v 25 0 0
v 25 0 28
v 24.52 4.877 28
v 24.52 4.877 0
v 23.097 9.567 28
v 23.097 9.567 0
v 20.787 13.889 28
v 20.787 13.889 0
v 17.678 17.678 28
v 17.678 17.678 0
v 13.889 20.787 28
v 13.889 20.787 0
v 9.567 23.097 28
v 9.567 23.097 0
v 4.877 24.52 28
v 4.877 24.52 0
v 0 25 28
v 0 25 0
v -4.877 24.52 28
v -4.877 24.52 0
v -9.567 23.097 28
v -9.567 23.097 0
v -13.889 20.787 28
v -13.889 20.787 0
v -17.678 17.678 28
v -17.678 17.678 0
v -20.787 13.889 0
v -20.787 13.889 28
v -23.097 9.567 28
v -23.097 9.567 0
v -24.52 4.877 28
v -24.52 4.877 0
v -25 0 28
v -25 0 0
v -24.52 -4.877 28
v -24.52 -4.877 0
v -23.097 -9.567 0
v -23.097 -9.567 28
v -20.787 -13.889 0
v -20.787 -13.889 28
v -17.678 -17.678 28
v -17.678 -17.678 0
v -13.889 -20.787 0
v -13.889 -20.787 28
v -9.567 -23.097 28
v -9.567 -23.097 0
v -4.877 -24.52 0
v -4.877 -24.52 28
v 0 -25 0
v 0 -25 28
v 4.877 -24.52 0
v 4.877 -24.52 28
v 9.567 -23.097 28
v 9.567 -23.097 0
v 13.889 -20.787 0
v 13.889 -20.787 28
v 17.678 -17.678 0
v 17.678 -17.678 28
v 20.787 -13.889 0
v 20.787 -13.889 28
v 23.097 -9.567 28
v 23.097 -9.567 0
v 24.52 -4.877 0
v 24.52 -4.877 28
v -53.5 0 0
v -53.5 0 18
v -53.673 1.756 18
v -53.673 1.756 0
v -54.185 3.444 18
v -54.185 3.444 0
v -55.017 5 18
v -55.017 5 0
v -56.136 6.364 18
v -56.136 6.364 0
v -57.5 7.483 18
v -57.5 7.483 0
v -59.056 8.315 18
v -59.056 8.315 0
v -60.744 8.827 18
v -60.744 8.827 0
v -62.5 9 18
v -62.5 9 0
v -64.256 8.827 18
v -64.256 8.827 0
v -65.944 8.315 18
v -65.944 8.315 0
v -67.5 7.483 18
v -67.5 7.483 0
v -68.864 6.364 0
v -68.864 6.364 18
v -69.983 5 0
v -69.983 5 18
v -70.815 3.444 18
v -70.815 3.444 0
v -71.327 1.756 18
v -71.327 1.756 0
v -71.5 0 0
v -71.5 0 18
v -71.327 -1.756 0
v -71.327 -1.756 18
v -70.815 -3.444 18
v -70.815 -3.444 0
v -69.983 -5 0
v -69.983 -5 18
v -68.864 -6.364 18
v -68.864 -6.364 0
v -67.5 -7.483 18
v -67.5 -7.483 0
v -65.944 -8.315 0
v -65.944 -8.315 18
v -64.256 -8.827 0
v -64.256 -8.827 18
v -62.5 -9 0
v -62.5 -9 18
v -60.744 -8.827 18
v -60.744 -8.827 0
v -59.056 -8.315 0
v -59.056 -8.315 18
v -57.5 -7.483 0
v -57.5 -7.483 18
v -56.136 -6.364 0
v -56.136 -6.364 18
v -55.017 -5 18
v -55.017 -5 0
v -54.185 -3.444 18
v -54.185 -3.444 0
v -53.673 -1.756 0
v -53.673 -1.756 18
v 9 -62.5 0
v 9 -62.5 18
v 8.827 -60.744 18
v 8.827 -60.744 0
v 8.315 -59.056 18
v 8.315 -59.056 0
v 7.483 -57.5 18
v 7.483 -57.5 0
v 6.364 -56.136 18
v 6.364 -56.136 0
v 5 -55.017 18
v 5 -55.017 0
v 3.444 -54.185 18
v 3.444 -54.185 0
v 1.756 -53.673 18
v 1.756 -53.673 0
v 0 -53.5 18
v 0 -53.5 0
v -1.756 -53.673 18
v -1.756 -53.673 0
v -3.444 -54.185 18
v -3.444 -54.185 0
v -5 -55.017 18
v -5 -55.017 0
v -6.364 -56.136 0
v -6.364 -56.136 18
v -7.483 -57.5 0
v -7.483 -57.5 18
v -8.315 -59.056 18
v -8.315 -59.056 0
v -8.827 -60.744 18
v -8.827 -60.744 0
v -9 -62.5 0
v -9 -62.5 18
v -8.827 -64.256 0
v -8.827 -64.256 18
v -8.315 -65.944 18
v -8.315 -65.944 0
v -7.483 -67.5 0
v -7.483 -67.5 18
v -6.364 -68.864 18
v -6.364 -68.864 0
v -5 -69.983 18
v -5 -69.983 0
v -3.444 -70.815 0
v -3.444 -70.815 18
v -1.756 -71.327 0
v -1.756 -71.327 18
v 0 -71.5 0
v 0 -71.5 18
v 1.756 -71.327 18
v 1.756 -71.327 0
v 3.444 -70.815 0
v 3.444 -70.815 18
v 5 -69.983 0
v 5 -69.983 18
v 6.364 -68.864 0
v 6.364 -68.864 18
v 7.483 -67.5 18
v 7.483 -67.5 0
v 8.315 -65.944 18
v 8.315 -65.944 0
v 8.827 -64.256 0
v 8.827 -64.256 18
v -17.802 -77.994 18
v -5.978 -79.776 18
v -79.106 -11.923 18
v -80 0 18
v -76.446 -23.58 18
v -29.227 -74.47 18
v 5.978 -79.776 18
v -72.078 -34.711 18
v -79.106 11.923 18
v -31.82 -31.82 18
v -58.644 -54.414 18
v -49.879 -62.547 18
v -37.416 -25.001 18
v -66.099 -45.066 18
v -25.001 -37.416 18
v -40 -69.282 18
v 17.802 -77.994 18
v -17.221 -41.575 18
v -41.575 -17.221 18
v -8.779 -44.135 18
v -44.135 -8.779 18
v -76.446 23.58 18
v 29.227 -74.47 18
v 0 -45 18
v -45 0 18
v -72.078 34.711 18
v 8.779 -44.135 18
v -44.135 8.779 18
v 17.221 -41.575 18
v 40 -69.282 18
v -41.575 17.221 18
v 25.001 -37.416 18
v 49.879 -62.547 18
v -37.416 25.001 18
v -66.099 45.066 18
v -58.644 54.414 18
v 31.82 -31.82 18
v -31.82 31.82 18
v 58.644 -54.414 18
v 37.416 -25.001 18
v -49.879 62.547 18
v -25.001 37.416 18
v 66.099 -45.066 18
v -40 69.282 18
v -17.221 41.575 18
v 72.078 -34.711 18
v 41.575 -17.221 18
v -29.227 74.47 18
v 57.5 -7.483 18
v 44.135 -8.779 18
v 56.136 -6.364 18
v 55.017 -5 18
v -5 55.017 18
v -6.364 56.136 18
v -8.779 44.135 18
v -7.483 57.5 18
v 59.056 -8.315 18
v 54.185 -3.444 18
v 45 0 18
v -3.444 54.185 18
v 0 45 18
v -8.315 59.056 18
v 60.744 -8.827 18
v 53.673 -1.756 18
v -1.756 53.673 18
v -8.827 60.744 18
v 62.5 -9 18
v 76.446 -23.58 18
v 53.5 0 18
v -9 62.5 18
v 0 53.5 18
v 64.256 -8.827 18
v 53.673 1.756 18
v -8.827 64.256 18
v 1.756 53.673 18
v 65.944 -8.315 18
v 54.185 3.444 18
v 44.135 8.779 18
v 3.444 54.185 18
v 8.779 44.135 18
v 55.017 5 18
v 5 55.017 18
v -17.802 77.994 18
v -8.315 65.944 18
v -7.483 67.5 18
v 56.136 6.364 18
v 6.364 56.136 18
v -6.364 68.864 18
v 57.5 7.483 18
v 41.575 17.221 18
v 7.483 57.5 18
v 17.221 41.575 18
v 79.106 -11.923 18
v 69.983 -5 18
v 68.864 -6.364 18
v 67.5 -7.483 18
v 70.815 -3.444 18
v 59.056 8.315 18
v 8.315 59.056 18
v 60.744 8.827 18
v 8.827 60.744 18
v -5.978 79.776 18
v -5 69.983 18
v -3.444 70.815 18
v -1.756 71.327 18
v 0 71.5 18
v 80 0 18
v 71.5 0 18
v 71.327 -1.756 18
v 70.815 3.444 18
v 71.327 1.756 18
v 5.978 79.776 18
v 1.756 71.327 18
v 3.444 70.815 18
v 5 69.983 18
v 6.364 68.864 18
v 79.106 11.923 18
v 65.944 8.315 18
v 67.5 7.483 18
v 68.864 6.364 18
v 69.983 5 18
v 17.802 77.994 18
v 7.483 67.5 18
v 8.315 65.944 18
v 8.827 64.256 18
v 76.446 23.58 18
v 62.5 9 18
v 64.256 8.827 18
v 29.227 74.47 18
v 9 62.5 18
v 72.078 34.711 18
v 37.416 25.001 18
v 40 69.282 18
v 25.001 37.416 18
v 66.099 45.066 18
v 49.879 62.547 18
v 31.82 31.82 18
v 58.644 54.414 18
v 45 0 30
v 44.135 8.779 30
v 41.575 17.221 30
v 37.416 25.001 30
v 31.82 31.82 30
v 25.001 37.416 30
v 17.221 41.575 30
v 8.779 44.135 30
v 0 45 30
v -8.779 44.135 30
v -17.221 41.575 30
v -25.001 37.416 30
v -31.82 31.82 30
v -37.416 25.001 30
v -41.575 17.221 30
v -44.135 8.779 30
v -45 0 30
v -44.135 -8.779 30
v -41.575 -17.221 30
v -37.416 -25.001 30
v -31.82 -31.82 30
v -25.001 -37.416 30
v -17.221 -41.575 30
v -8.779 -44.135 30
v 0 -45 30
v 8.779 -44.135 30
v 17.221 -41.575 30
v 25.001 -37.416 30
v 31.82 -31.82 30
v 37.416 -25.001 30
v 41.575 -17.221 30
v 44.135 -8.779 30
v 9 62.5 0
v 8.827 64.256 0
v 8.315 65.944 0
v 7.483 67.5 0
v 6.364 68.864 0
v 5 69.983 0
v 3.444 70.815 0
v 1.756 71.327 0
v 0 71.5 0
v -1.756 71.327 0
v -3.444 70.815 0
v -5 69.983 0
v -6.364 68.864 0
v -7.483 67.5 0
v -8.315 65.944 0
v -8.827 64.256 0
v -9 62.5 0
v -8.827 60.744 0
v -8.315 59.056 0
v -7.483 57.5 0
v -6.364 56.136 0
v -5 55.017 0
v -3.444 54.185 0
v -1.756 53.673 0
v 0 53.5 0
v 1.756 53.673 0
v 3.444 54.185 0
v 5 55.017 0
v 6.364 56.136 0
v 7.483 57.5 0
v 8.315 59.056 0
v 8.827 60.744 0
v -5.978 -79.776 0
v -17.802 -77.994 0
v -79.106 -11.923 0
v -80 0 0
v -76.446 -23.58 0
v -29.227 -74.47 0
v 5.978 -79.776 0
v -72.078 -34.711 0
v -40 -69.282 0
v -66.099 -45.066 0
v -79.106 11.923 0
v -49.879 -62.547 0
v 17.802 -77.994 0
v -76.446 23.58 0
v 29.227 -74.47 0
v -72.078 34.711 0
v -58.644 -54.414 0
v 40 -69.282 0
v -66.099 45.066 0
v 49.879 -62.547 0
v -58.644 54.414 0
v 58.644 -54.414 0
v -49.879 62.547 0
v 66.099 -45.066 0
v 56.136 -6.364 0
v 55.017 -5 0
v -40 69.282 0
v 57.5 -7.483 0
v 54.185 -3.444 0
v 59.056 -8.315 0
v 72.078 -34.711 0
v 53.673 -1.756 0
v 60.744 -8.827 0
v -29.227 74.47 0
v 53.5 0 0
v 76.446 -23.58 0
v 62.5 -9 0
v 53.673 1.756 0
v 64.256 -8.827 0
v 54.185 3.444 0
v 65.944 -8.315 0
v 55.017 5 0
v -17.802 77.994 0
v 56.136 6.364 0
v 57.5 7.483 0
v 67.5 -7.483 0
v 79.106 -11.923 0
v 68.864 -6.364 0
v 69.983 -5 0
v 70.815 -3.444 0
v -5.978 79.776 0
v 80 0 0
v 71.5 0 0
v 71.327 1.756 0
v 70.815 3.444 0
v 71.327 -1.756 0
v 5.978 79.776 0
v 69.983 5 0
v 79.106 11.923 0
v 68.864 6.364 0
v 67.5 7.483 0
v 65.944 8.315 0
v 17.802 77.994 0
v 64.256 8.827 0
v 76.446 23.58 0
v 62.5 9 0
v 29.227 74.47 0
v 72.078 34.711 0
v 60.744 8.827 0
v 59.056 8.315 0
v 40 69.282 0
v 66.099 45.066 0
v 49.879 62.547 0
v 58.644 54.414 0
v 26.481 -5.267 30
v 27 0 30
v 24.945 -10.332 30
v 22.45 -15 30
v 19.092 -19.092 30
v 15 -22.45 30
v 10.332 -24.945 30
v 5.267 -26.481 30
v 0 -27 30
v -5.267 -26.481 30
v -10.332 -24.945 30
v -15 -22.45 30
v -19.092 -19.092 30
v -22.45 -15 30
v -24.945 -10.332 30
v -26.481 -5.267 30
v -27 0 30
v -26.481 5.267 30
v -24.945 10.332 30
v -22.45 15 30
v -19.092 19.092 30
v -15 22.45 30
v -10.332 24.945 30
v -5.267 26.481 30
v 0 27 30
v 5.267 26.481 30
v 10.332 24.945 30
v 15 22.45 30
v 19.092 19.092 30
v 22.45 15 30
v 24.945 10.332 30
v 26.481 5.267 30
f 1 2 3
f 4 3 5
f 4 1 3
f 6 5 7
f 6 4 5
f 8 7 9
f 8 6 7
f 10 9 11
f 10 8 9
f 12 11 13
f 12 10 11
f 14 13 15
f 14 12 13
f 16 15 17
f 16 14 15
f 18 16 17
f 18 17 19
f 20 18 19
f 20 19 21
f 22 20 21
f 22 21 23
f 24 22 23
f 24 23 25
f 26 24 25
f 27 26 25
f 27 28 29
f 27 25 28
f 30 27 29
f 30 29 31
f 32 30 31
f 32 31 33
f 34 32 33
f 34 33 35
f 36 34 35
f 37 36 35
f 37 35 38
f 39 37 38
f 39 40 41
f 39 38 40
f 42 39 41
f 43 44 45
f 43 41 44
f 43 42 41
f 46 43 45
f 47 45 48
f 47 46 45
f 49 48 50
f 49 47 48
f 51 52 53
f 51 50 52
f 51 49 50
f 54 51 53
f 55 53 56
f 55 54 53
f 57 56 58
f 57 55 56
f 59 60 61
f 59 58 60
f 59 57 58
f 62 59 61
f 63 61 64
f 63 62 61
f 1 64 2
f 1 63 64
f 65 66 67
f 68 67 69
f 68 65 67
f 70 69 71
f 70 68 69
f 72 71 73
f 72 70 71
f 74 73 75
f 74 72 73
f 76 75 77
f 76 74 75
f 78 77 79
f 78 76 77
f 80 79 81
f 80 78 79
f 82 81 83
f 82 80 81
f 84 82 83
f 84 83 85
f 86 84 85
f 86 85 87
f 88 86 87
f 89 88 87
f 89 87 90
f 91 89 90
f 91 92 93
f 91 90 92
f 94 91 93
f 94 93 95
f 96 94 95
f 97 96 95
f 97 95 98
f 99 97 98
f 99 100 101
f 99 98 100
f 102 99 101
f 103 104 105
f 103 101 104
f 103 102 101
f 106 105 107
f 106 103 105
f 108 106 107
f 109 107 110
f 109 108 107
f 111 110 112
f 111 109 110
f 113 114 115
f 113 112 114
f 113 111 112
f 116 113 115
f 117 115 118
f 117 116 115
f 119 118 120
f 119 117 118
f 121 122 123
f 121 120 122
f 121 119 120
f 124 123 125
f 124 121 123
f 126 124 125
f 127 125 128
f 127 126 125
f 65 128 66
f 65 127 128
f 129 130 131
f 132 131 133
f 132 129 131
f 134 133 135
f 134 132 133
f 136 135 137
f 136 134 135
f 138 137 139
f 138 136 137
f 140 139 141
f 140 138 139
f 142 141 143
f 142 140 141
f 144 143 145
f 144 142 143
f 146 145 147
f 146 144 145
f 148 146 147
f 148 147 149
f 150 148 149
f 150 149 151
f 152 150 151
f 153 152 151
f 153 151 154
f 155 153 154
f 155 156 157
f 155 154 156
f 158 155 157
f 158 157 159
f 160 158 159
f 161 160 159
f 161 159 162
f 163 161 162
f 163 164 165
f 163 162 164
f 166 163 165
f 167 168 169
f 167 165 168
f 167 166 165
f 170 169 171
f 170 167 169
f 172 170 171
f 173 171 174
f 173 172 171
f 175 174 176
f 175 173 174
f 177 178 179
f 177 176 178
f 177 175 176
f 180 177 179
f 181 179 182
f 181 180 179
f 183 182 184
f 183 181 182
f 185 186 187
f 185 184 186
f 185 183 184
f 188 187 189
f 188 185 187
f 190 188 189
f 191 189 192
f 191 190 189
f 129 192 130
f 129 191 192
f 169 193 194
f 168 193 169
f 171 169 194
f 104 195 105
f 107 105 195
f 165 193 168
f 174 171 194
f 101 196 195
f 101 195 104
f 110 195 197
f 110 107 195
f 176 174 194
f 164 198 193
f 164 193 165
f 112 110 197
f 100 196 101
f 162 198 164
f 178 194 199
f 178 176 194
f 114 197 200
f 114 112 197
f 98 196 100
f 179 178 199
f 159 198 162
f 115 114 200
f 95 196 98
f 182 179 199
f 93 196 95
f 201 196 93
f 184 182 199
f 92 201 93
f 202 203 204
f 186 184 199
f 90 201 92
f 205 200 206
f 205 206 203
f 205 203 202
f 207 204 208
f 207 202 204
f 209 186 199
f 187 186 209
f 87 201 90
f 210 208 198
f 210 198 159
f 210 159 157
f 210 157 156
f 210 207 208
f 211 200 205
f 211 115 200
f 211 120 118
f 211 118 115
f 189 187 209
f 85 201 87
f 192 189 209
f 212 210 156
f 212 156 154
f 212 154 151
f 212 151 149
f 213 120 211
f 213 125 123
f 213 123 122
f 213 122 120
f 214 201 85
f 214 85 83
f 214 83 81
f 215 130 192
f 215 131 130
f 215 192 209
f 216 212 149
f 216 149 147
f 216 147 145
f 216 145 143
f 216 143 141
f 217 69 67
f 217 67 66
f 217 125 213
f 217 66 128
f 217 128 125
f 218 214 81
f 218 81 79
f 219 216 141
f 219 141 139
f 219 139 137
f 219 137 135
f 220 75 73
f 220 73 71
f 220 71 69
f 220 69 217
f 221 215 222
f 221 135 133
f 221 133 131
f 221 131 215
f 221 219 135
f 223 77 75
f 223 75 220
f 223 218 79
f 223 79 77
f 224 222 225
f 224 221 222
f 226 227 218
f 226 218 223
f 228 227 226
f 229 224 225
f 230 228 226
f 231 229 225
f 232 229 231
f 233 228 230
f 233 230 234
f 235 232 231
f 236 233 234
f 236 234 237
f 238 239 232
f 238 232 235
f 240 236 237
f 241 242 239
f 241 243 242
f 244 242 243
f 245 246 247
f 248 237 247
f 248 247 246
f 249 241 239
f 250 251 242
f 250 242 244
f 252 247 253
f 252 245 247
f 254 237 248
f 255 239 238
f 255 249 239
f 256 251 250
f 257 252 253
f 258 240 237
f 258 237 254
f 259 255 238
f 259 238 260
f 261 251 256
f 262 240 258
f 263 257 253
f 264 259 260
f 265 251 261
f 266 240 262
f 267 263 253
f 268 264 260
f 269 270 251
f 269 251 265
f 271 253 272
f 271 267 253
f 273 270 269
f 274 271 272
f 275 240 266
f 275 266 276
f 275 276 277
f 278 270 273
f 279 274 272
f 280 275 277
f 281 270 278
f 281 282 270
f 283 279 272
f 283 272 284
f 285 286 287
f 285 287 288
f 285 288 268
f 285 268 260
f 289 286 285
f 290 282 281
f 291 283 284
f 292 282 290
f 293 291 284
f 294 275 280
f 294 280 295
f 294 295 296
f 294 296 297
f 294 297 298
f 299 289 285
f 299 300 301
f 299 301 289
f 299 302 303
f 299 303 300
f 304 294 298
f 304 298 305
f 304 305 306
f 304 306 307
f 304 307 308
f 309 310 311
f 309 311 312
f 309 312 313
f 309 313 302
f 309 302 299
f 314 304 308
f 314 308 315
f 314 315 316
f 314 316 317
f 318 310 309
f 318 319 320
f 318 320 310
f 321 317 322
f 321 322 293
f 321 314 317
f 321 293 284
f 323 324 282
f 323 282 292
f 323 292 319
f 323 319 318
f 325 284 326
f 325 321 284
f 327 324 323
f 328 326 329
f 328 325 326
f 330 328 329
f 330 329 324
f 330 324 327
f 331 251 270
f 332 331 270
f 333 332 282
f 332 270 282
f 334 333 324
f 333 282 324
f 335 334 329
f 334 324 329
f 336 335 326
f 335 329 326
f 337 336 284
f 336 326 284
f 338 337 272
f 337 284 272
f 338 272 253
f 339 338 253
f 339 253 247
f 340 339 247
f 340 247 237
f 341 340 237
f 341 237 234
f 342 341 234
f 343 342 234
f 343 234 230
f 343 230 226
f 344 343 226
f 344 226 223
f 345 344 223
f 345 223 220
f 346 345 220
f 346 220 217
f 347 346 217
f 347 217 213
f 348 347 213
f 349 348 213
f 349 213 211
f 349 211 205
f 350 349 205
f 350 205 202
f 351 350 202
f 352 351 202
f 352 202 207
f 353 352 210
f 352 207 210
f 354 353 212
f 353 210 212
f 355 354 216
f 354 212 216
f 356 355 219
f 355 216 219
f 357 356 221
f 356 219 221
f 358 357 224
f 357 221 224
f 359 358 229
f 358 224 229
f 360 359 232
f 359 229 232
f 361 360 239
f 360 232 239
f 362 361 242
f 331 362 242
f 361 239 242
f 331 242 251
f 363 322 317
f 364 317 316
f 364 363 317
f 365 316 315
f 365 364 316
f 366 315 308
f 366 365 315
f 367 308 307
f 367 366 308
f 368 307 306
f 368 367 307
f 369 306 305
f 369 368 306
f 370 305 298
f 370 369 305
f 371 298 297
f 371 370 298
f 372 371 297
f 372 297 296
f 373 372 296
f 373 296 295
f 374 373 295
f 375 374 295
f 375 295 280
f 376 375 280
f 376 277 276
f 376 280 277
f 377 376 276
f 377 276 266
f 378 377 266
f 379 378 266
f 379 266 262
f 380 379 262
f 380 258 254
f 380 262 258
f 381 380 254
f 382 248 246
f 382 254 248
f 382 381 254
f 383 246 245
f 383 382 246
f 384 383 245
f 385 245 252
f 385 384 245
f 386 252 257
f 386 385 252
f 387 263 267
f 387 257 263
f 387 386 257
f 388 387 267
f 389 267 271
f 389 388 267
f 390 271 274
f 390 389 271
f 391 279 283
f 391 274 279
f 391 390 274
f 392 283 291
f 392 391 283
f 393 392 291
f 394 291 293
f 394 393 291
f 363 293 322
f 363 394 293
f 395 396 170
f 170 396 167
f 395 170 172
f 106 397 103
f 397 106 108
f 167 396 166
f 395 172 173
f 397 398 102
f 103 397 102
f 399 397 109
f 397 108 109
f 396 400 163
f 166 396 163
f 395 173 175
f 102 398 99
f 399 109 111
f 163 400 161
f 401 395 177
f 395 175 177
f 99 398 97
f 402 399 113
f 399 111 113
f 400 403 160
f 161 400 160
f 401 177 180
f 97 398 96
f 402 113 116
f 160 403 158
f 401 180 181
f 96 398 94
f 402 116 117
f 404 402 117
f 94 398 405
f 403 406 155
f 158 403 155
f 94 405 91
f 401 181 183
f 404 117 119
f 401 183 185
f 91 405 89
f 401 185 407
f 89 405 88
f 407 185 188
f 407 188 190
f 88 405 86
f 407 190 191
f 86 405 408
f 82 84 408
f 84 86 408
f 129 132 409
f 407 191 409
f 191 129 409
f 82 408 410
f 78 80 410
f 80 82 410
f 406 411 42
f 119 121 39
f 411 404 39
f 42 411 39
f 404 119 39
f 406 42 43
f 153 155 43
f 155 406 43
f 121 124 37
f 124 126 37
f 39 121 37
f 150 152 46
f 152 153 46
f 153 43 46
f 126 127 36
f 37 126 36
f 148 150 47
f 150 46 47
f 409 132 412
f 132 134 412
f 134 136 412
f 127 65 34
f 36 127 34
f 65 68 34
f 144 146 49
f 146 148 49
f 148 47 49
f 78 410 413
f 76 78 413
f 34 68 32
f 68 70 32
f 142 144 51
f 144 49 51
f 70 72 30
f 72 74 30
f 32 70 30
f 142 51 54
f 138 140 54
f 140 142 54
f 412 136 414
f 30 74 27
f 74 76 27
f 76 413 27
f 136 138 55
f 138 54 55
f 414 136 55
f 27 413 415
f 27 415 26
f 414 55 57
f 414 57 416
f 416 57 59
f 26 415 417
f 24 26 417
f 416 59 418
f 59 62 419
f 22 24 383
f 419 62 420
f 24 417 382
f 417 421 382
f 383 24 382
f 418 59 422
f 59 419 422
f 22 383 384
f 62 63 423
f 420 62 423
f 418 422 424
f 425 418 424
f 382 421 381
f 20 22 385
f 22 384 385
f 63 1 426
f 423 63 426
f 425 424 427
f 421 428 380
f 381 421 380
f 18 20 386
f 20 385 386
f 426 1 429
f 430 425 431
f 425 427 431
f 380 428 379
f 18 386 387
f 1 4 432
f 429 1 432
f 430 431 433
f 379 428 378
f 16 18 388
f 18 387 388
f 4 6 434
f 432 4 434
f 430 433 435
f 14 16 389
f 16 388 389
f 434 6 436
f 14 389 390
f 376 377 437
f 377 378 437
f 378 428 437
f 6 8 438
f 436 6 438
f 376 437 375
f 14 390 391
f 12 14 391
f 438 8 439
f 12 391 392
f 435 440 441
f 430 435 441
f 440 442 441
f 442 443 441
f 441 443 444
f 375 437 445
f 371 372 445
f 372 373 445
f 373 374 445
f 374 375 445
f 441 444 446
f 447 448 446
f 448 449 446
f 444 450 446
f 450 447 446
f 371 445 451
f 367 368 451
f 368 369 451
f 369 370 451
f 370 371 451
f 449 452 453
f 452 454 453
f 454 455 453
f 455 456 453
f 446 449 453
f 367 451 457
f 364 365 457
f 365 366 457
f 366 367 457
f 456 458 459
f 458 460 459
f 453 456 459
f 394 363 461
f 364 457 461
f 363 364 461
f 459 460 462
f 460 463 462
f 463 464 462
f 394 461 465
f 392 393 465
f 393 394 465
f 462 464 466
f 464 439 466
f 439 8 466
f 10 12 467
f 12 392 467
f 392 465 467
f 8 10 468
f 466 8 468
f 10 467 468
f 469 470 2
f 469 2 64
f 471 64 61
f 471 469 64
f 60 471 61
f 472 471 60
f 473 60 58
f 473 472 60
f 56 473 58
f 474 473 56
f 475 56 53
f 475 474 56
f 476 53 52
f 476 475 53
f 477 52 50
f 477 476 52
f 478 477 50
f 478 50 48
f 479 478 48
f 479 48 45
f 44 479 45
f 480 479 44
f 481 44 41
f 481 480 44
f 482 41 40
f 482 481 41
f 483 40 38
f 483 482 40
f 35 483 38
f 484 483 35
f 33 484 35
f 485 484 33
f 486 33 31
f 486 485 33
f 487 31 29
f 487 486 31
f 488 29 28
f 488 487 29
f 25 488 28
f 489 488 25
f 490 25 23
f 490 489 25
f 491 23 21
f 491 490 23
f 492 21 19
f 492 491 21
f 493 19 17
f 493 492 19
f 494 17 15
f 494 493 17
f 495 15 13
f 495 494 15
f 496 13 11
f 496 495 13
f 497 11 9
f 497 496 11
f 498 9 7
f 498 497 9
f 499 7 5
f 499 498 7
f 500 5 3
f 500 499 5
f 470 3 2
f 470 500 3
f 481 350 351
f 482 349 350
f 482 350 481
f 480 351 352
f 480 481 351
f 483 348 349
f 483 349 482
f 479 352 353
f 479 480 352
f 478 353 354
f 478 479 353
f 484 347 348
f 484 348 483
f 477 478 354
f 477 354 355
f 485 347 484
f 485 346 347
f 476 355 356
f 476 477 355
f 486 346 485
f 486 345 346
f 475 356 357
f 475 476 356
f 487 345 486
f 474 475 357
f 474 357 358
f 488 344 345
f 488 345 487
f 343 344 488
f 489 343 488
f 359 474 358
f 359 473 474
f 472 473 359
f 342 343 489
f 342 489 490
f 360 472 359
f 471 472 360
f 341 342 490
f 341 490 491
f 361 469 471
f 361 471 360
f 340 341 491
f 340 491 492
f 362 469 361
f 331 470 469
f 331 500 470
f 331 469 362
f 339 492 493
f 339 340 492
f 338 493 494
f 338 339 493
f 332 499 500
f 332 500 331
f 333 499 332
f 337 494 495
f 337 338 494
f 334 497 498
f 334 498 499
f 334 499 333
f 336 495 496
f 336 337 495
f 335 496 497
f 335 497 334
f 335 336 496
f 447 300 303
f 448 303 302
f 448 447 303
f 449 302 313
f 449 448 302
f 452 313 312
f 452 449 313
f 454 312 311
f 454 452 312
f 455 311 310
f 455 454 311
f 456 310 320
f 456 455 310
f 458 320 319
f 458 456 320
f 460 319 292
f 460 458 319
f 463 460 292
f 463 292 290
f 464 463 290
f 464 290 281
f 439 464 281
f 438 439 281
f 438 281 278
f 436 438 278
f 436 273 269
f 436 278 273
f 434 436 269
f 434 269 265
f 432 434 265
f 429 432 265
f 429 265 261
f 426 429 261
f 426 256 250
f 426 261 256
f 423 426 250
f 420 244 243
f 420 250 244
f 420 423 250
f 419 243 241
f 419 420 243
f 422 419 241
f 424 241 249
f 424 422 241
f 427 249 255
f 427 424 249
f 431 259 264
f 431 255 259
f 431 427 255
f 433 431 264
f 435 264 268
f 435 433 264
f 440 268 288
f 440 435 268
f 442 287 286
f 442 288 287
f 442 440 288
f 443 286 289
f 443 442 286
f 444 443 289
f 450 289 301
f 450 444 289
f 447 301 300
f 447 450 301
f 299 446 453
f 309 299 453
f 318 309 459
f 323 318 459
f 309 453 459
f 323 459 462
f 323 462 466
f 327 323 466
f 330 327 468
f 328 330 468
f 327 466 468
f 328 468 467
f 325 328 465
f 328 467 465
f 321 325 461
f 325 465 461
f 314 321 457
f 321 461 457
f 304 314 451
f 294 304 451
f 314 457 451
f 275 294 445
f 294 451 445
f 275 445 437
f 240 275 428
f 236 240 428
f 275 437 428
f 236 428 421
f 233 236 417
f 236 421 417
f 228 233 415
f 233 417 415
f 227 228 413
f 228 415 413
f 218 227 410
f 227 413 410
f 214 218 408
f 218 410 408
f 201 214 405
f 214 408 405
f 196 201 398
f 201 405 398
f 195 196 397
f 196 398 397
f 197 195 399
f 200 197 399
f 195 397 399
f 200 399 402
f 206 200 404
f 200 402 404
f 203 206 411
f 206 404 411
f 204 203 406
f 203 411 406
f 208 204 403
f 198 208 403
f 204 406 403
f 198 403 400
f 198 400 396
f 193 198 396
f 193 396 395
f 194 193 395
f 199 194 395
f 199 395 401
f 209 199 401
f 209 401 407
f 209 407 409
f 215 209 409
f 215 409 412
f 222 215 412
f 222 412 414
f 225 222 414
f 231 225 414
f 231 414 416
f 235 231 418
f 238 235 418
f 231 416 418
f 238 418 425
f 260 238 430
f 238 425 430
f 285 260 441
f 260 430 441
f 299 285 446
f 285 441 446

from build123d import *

# Parameters (mm, degrees)
SKETCH_1_R          = 80
EXTRUDE_1_DEPTH     = 18
SKETCH_2_R          = 45
EXTRUDE_2_DEPTH     = 30
SKETCH_3_R          = 25
CUT_EXTRUDE_1_DEPTH = 118.046999107
SKETCH_4_R          = 9
CUT_EXTRUDE_2_DEPTH = 118.046999107
CHAMFER_1_SIZE      = 2


with BuildPart() as part:
    # 草图1 → 凸台-拉伸1 (new body)
    with BuildSketch(Plane.XY):
        Circle(SKETCH_1_R)
    extrude(amount=EXTRUDE_1_DEPTH)

    # 草图2 → 凸台-拉伸2 (add)
    with BuildSketch(Plane.XY):
        Circle(SKETCH_2_R)
    extrude(amount=EXTRUDE_2_DEPTH)

    # 草图3 → 切除-拉伸1 (cut, through all)
    with BuildSketch(Plane.XY):
        Circle(SKETCH_3_R)
    extrude(amount=CUT_EXTRUDE_1_DEPTH, mode=Mode.SUBTRACT)

    # 草图4 → 切除-拉伸2 (cut, through all)
    with BuildSketch(Plane.XY):
        with Locations((62.5, 0)):
            Circle(SKETCH_4_R)
        with Locations((0, 62.5)):
            Circle(SKETCH_4_R)
        with Locations((-62.5, 0)):
            Circle(SKETCH_4_R)
        with Locations((0, -62.5)):
            Circle(SKETCH_4_R)
    extrude(amount=CUT_EXTRUDE_2_DEPTH, mode=Mode.SUBTRACT)

    # 倒角1
    chamfer_1_edges = [part.edges().sort_by_distance(p)[0] for p in [
        (-25, 0, 30),
    ]]
    chamfer(chamfer_1_edges, length=CHAMFER_1_SIZE)


solid = part.part
